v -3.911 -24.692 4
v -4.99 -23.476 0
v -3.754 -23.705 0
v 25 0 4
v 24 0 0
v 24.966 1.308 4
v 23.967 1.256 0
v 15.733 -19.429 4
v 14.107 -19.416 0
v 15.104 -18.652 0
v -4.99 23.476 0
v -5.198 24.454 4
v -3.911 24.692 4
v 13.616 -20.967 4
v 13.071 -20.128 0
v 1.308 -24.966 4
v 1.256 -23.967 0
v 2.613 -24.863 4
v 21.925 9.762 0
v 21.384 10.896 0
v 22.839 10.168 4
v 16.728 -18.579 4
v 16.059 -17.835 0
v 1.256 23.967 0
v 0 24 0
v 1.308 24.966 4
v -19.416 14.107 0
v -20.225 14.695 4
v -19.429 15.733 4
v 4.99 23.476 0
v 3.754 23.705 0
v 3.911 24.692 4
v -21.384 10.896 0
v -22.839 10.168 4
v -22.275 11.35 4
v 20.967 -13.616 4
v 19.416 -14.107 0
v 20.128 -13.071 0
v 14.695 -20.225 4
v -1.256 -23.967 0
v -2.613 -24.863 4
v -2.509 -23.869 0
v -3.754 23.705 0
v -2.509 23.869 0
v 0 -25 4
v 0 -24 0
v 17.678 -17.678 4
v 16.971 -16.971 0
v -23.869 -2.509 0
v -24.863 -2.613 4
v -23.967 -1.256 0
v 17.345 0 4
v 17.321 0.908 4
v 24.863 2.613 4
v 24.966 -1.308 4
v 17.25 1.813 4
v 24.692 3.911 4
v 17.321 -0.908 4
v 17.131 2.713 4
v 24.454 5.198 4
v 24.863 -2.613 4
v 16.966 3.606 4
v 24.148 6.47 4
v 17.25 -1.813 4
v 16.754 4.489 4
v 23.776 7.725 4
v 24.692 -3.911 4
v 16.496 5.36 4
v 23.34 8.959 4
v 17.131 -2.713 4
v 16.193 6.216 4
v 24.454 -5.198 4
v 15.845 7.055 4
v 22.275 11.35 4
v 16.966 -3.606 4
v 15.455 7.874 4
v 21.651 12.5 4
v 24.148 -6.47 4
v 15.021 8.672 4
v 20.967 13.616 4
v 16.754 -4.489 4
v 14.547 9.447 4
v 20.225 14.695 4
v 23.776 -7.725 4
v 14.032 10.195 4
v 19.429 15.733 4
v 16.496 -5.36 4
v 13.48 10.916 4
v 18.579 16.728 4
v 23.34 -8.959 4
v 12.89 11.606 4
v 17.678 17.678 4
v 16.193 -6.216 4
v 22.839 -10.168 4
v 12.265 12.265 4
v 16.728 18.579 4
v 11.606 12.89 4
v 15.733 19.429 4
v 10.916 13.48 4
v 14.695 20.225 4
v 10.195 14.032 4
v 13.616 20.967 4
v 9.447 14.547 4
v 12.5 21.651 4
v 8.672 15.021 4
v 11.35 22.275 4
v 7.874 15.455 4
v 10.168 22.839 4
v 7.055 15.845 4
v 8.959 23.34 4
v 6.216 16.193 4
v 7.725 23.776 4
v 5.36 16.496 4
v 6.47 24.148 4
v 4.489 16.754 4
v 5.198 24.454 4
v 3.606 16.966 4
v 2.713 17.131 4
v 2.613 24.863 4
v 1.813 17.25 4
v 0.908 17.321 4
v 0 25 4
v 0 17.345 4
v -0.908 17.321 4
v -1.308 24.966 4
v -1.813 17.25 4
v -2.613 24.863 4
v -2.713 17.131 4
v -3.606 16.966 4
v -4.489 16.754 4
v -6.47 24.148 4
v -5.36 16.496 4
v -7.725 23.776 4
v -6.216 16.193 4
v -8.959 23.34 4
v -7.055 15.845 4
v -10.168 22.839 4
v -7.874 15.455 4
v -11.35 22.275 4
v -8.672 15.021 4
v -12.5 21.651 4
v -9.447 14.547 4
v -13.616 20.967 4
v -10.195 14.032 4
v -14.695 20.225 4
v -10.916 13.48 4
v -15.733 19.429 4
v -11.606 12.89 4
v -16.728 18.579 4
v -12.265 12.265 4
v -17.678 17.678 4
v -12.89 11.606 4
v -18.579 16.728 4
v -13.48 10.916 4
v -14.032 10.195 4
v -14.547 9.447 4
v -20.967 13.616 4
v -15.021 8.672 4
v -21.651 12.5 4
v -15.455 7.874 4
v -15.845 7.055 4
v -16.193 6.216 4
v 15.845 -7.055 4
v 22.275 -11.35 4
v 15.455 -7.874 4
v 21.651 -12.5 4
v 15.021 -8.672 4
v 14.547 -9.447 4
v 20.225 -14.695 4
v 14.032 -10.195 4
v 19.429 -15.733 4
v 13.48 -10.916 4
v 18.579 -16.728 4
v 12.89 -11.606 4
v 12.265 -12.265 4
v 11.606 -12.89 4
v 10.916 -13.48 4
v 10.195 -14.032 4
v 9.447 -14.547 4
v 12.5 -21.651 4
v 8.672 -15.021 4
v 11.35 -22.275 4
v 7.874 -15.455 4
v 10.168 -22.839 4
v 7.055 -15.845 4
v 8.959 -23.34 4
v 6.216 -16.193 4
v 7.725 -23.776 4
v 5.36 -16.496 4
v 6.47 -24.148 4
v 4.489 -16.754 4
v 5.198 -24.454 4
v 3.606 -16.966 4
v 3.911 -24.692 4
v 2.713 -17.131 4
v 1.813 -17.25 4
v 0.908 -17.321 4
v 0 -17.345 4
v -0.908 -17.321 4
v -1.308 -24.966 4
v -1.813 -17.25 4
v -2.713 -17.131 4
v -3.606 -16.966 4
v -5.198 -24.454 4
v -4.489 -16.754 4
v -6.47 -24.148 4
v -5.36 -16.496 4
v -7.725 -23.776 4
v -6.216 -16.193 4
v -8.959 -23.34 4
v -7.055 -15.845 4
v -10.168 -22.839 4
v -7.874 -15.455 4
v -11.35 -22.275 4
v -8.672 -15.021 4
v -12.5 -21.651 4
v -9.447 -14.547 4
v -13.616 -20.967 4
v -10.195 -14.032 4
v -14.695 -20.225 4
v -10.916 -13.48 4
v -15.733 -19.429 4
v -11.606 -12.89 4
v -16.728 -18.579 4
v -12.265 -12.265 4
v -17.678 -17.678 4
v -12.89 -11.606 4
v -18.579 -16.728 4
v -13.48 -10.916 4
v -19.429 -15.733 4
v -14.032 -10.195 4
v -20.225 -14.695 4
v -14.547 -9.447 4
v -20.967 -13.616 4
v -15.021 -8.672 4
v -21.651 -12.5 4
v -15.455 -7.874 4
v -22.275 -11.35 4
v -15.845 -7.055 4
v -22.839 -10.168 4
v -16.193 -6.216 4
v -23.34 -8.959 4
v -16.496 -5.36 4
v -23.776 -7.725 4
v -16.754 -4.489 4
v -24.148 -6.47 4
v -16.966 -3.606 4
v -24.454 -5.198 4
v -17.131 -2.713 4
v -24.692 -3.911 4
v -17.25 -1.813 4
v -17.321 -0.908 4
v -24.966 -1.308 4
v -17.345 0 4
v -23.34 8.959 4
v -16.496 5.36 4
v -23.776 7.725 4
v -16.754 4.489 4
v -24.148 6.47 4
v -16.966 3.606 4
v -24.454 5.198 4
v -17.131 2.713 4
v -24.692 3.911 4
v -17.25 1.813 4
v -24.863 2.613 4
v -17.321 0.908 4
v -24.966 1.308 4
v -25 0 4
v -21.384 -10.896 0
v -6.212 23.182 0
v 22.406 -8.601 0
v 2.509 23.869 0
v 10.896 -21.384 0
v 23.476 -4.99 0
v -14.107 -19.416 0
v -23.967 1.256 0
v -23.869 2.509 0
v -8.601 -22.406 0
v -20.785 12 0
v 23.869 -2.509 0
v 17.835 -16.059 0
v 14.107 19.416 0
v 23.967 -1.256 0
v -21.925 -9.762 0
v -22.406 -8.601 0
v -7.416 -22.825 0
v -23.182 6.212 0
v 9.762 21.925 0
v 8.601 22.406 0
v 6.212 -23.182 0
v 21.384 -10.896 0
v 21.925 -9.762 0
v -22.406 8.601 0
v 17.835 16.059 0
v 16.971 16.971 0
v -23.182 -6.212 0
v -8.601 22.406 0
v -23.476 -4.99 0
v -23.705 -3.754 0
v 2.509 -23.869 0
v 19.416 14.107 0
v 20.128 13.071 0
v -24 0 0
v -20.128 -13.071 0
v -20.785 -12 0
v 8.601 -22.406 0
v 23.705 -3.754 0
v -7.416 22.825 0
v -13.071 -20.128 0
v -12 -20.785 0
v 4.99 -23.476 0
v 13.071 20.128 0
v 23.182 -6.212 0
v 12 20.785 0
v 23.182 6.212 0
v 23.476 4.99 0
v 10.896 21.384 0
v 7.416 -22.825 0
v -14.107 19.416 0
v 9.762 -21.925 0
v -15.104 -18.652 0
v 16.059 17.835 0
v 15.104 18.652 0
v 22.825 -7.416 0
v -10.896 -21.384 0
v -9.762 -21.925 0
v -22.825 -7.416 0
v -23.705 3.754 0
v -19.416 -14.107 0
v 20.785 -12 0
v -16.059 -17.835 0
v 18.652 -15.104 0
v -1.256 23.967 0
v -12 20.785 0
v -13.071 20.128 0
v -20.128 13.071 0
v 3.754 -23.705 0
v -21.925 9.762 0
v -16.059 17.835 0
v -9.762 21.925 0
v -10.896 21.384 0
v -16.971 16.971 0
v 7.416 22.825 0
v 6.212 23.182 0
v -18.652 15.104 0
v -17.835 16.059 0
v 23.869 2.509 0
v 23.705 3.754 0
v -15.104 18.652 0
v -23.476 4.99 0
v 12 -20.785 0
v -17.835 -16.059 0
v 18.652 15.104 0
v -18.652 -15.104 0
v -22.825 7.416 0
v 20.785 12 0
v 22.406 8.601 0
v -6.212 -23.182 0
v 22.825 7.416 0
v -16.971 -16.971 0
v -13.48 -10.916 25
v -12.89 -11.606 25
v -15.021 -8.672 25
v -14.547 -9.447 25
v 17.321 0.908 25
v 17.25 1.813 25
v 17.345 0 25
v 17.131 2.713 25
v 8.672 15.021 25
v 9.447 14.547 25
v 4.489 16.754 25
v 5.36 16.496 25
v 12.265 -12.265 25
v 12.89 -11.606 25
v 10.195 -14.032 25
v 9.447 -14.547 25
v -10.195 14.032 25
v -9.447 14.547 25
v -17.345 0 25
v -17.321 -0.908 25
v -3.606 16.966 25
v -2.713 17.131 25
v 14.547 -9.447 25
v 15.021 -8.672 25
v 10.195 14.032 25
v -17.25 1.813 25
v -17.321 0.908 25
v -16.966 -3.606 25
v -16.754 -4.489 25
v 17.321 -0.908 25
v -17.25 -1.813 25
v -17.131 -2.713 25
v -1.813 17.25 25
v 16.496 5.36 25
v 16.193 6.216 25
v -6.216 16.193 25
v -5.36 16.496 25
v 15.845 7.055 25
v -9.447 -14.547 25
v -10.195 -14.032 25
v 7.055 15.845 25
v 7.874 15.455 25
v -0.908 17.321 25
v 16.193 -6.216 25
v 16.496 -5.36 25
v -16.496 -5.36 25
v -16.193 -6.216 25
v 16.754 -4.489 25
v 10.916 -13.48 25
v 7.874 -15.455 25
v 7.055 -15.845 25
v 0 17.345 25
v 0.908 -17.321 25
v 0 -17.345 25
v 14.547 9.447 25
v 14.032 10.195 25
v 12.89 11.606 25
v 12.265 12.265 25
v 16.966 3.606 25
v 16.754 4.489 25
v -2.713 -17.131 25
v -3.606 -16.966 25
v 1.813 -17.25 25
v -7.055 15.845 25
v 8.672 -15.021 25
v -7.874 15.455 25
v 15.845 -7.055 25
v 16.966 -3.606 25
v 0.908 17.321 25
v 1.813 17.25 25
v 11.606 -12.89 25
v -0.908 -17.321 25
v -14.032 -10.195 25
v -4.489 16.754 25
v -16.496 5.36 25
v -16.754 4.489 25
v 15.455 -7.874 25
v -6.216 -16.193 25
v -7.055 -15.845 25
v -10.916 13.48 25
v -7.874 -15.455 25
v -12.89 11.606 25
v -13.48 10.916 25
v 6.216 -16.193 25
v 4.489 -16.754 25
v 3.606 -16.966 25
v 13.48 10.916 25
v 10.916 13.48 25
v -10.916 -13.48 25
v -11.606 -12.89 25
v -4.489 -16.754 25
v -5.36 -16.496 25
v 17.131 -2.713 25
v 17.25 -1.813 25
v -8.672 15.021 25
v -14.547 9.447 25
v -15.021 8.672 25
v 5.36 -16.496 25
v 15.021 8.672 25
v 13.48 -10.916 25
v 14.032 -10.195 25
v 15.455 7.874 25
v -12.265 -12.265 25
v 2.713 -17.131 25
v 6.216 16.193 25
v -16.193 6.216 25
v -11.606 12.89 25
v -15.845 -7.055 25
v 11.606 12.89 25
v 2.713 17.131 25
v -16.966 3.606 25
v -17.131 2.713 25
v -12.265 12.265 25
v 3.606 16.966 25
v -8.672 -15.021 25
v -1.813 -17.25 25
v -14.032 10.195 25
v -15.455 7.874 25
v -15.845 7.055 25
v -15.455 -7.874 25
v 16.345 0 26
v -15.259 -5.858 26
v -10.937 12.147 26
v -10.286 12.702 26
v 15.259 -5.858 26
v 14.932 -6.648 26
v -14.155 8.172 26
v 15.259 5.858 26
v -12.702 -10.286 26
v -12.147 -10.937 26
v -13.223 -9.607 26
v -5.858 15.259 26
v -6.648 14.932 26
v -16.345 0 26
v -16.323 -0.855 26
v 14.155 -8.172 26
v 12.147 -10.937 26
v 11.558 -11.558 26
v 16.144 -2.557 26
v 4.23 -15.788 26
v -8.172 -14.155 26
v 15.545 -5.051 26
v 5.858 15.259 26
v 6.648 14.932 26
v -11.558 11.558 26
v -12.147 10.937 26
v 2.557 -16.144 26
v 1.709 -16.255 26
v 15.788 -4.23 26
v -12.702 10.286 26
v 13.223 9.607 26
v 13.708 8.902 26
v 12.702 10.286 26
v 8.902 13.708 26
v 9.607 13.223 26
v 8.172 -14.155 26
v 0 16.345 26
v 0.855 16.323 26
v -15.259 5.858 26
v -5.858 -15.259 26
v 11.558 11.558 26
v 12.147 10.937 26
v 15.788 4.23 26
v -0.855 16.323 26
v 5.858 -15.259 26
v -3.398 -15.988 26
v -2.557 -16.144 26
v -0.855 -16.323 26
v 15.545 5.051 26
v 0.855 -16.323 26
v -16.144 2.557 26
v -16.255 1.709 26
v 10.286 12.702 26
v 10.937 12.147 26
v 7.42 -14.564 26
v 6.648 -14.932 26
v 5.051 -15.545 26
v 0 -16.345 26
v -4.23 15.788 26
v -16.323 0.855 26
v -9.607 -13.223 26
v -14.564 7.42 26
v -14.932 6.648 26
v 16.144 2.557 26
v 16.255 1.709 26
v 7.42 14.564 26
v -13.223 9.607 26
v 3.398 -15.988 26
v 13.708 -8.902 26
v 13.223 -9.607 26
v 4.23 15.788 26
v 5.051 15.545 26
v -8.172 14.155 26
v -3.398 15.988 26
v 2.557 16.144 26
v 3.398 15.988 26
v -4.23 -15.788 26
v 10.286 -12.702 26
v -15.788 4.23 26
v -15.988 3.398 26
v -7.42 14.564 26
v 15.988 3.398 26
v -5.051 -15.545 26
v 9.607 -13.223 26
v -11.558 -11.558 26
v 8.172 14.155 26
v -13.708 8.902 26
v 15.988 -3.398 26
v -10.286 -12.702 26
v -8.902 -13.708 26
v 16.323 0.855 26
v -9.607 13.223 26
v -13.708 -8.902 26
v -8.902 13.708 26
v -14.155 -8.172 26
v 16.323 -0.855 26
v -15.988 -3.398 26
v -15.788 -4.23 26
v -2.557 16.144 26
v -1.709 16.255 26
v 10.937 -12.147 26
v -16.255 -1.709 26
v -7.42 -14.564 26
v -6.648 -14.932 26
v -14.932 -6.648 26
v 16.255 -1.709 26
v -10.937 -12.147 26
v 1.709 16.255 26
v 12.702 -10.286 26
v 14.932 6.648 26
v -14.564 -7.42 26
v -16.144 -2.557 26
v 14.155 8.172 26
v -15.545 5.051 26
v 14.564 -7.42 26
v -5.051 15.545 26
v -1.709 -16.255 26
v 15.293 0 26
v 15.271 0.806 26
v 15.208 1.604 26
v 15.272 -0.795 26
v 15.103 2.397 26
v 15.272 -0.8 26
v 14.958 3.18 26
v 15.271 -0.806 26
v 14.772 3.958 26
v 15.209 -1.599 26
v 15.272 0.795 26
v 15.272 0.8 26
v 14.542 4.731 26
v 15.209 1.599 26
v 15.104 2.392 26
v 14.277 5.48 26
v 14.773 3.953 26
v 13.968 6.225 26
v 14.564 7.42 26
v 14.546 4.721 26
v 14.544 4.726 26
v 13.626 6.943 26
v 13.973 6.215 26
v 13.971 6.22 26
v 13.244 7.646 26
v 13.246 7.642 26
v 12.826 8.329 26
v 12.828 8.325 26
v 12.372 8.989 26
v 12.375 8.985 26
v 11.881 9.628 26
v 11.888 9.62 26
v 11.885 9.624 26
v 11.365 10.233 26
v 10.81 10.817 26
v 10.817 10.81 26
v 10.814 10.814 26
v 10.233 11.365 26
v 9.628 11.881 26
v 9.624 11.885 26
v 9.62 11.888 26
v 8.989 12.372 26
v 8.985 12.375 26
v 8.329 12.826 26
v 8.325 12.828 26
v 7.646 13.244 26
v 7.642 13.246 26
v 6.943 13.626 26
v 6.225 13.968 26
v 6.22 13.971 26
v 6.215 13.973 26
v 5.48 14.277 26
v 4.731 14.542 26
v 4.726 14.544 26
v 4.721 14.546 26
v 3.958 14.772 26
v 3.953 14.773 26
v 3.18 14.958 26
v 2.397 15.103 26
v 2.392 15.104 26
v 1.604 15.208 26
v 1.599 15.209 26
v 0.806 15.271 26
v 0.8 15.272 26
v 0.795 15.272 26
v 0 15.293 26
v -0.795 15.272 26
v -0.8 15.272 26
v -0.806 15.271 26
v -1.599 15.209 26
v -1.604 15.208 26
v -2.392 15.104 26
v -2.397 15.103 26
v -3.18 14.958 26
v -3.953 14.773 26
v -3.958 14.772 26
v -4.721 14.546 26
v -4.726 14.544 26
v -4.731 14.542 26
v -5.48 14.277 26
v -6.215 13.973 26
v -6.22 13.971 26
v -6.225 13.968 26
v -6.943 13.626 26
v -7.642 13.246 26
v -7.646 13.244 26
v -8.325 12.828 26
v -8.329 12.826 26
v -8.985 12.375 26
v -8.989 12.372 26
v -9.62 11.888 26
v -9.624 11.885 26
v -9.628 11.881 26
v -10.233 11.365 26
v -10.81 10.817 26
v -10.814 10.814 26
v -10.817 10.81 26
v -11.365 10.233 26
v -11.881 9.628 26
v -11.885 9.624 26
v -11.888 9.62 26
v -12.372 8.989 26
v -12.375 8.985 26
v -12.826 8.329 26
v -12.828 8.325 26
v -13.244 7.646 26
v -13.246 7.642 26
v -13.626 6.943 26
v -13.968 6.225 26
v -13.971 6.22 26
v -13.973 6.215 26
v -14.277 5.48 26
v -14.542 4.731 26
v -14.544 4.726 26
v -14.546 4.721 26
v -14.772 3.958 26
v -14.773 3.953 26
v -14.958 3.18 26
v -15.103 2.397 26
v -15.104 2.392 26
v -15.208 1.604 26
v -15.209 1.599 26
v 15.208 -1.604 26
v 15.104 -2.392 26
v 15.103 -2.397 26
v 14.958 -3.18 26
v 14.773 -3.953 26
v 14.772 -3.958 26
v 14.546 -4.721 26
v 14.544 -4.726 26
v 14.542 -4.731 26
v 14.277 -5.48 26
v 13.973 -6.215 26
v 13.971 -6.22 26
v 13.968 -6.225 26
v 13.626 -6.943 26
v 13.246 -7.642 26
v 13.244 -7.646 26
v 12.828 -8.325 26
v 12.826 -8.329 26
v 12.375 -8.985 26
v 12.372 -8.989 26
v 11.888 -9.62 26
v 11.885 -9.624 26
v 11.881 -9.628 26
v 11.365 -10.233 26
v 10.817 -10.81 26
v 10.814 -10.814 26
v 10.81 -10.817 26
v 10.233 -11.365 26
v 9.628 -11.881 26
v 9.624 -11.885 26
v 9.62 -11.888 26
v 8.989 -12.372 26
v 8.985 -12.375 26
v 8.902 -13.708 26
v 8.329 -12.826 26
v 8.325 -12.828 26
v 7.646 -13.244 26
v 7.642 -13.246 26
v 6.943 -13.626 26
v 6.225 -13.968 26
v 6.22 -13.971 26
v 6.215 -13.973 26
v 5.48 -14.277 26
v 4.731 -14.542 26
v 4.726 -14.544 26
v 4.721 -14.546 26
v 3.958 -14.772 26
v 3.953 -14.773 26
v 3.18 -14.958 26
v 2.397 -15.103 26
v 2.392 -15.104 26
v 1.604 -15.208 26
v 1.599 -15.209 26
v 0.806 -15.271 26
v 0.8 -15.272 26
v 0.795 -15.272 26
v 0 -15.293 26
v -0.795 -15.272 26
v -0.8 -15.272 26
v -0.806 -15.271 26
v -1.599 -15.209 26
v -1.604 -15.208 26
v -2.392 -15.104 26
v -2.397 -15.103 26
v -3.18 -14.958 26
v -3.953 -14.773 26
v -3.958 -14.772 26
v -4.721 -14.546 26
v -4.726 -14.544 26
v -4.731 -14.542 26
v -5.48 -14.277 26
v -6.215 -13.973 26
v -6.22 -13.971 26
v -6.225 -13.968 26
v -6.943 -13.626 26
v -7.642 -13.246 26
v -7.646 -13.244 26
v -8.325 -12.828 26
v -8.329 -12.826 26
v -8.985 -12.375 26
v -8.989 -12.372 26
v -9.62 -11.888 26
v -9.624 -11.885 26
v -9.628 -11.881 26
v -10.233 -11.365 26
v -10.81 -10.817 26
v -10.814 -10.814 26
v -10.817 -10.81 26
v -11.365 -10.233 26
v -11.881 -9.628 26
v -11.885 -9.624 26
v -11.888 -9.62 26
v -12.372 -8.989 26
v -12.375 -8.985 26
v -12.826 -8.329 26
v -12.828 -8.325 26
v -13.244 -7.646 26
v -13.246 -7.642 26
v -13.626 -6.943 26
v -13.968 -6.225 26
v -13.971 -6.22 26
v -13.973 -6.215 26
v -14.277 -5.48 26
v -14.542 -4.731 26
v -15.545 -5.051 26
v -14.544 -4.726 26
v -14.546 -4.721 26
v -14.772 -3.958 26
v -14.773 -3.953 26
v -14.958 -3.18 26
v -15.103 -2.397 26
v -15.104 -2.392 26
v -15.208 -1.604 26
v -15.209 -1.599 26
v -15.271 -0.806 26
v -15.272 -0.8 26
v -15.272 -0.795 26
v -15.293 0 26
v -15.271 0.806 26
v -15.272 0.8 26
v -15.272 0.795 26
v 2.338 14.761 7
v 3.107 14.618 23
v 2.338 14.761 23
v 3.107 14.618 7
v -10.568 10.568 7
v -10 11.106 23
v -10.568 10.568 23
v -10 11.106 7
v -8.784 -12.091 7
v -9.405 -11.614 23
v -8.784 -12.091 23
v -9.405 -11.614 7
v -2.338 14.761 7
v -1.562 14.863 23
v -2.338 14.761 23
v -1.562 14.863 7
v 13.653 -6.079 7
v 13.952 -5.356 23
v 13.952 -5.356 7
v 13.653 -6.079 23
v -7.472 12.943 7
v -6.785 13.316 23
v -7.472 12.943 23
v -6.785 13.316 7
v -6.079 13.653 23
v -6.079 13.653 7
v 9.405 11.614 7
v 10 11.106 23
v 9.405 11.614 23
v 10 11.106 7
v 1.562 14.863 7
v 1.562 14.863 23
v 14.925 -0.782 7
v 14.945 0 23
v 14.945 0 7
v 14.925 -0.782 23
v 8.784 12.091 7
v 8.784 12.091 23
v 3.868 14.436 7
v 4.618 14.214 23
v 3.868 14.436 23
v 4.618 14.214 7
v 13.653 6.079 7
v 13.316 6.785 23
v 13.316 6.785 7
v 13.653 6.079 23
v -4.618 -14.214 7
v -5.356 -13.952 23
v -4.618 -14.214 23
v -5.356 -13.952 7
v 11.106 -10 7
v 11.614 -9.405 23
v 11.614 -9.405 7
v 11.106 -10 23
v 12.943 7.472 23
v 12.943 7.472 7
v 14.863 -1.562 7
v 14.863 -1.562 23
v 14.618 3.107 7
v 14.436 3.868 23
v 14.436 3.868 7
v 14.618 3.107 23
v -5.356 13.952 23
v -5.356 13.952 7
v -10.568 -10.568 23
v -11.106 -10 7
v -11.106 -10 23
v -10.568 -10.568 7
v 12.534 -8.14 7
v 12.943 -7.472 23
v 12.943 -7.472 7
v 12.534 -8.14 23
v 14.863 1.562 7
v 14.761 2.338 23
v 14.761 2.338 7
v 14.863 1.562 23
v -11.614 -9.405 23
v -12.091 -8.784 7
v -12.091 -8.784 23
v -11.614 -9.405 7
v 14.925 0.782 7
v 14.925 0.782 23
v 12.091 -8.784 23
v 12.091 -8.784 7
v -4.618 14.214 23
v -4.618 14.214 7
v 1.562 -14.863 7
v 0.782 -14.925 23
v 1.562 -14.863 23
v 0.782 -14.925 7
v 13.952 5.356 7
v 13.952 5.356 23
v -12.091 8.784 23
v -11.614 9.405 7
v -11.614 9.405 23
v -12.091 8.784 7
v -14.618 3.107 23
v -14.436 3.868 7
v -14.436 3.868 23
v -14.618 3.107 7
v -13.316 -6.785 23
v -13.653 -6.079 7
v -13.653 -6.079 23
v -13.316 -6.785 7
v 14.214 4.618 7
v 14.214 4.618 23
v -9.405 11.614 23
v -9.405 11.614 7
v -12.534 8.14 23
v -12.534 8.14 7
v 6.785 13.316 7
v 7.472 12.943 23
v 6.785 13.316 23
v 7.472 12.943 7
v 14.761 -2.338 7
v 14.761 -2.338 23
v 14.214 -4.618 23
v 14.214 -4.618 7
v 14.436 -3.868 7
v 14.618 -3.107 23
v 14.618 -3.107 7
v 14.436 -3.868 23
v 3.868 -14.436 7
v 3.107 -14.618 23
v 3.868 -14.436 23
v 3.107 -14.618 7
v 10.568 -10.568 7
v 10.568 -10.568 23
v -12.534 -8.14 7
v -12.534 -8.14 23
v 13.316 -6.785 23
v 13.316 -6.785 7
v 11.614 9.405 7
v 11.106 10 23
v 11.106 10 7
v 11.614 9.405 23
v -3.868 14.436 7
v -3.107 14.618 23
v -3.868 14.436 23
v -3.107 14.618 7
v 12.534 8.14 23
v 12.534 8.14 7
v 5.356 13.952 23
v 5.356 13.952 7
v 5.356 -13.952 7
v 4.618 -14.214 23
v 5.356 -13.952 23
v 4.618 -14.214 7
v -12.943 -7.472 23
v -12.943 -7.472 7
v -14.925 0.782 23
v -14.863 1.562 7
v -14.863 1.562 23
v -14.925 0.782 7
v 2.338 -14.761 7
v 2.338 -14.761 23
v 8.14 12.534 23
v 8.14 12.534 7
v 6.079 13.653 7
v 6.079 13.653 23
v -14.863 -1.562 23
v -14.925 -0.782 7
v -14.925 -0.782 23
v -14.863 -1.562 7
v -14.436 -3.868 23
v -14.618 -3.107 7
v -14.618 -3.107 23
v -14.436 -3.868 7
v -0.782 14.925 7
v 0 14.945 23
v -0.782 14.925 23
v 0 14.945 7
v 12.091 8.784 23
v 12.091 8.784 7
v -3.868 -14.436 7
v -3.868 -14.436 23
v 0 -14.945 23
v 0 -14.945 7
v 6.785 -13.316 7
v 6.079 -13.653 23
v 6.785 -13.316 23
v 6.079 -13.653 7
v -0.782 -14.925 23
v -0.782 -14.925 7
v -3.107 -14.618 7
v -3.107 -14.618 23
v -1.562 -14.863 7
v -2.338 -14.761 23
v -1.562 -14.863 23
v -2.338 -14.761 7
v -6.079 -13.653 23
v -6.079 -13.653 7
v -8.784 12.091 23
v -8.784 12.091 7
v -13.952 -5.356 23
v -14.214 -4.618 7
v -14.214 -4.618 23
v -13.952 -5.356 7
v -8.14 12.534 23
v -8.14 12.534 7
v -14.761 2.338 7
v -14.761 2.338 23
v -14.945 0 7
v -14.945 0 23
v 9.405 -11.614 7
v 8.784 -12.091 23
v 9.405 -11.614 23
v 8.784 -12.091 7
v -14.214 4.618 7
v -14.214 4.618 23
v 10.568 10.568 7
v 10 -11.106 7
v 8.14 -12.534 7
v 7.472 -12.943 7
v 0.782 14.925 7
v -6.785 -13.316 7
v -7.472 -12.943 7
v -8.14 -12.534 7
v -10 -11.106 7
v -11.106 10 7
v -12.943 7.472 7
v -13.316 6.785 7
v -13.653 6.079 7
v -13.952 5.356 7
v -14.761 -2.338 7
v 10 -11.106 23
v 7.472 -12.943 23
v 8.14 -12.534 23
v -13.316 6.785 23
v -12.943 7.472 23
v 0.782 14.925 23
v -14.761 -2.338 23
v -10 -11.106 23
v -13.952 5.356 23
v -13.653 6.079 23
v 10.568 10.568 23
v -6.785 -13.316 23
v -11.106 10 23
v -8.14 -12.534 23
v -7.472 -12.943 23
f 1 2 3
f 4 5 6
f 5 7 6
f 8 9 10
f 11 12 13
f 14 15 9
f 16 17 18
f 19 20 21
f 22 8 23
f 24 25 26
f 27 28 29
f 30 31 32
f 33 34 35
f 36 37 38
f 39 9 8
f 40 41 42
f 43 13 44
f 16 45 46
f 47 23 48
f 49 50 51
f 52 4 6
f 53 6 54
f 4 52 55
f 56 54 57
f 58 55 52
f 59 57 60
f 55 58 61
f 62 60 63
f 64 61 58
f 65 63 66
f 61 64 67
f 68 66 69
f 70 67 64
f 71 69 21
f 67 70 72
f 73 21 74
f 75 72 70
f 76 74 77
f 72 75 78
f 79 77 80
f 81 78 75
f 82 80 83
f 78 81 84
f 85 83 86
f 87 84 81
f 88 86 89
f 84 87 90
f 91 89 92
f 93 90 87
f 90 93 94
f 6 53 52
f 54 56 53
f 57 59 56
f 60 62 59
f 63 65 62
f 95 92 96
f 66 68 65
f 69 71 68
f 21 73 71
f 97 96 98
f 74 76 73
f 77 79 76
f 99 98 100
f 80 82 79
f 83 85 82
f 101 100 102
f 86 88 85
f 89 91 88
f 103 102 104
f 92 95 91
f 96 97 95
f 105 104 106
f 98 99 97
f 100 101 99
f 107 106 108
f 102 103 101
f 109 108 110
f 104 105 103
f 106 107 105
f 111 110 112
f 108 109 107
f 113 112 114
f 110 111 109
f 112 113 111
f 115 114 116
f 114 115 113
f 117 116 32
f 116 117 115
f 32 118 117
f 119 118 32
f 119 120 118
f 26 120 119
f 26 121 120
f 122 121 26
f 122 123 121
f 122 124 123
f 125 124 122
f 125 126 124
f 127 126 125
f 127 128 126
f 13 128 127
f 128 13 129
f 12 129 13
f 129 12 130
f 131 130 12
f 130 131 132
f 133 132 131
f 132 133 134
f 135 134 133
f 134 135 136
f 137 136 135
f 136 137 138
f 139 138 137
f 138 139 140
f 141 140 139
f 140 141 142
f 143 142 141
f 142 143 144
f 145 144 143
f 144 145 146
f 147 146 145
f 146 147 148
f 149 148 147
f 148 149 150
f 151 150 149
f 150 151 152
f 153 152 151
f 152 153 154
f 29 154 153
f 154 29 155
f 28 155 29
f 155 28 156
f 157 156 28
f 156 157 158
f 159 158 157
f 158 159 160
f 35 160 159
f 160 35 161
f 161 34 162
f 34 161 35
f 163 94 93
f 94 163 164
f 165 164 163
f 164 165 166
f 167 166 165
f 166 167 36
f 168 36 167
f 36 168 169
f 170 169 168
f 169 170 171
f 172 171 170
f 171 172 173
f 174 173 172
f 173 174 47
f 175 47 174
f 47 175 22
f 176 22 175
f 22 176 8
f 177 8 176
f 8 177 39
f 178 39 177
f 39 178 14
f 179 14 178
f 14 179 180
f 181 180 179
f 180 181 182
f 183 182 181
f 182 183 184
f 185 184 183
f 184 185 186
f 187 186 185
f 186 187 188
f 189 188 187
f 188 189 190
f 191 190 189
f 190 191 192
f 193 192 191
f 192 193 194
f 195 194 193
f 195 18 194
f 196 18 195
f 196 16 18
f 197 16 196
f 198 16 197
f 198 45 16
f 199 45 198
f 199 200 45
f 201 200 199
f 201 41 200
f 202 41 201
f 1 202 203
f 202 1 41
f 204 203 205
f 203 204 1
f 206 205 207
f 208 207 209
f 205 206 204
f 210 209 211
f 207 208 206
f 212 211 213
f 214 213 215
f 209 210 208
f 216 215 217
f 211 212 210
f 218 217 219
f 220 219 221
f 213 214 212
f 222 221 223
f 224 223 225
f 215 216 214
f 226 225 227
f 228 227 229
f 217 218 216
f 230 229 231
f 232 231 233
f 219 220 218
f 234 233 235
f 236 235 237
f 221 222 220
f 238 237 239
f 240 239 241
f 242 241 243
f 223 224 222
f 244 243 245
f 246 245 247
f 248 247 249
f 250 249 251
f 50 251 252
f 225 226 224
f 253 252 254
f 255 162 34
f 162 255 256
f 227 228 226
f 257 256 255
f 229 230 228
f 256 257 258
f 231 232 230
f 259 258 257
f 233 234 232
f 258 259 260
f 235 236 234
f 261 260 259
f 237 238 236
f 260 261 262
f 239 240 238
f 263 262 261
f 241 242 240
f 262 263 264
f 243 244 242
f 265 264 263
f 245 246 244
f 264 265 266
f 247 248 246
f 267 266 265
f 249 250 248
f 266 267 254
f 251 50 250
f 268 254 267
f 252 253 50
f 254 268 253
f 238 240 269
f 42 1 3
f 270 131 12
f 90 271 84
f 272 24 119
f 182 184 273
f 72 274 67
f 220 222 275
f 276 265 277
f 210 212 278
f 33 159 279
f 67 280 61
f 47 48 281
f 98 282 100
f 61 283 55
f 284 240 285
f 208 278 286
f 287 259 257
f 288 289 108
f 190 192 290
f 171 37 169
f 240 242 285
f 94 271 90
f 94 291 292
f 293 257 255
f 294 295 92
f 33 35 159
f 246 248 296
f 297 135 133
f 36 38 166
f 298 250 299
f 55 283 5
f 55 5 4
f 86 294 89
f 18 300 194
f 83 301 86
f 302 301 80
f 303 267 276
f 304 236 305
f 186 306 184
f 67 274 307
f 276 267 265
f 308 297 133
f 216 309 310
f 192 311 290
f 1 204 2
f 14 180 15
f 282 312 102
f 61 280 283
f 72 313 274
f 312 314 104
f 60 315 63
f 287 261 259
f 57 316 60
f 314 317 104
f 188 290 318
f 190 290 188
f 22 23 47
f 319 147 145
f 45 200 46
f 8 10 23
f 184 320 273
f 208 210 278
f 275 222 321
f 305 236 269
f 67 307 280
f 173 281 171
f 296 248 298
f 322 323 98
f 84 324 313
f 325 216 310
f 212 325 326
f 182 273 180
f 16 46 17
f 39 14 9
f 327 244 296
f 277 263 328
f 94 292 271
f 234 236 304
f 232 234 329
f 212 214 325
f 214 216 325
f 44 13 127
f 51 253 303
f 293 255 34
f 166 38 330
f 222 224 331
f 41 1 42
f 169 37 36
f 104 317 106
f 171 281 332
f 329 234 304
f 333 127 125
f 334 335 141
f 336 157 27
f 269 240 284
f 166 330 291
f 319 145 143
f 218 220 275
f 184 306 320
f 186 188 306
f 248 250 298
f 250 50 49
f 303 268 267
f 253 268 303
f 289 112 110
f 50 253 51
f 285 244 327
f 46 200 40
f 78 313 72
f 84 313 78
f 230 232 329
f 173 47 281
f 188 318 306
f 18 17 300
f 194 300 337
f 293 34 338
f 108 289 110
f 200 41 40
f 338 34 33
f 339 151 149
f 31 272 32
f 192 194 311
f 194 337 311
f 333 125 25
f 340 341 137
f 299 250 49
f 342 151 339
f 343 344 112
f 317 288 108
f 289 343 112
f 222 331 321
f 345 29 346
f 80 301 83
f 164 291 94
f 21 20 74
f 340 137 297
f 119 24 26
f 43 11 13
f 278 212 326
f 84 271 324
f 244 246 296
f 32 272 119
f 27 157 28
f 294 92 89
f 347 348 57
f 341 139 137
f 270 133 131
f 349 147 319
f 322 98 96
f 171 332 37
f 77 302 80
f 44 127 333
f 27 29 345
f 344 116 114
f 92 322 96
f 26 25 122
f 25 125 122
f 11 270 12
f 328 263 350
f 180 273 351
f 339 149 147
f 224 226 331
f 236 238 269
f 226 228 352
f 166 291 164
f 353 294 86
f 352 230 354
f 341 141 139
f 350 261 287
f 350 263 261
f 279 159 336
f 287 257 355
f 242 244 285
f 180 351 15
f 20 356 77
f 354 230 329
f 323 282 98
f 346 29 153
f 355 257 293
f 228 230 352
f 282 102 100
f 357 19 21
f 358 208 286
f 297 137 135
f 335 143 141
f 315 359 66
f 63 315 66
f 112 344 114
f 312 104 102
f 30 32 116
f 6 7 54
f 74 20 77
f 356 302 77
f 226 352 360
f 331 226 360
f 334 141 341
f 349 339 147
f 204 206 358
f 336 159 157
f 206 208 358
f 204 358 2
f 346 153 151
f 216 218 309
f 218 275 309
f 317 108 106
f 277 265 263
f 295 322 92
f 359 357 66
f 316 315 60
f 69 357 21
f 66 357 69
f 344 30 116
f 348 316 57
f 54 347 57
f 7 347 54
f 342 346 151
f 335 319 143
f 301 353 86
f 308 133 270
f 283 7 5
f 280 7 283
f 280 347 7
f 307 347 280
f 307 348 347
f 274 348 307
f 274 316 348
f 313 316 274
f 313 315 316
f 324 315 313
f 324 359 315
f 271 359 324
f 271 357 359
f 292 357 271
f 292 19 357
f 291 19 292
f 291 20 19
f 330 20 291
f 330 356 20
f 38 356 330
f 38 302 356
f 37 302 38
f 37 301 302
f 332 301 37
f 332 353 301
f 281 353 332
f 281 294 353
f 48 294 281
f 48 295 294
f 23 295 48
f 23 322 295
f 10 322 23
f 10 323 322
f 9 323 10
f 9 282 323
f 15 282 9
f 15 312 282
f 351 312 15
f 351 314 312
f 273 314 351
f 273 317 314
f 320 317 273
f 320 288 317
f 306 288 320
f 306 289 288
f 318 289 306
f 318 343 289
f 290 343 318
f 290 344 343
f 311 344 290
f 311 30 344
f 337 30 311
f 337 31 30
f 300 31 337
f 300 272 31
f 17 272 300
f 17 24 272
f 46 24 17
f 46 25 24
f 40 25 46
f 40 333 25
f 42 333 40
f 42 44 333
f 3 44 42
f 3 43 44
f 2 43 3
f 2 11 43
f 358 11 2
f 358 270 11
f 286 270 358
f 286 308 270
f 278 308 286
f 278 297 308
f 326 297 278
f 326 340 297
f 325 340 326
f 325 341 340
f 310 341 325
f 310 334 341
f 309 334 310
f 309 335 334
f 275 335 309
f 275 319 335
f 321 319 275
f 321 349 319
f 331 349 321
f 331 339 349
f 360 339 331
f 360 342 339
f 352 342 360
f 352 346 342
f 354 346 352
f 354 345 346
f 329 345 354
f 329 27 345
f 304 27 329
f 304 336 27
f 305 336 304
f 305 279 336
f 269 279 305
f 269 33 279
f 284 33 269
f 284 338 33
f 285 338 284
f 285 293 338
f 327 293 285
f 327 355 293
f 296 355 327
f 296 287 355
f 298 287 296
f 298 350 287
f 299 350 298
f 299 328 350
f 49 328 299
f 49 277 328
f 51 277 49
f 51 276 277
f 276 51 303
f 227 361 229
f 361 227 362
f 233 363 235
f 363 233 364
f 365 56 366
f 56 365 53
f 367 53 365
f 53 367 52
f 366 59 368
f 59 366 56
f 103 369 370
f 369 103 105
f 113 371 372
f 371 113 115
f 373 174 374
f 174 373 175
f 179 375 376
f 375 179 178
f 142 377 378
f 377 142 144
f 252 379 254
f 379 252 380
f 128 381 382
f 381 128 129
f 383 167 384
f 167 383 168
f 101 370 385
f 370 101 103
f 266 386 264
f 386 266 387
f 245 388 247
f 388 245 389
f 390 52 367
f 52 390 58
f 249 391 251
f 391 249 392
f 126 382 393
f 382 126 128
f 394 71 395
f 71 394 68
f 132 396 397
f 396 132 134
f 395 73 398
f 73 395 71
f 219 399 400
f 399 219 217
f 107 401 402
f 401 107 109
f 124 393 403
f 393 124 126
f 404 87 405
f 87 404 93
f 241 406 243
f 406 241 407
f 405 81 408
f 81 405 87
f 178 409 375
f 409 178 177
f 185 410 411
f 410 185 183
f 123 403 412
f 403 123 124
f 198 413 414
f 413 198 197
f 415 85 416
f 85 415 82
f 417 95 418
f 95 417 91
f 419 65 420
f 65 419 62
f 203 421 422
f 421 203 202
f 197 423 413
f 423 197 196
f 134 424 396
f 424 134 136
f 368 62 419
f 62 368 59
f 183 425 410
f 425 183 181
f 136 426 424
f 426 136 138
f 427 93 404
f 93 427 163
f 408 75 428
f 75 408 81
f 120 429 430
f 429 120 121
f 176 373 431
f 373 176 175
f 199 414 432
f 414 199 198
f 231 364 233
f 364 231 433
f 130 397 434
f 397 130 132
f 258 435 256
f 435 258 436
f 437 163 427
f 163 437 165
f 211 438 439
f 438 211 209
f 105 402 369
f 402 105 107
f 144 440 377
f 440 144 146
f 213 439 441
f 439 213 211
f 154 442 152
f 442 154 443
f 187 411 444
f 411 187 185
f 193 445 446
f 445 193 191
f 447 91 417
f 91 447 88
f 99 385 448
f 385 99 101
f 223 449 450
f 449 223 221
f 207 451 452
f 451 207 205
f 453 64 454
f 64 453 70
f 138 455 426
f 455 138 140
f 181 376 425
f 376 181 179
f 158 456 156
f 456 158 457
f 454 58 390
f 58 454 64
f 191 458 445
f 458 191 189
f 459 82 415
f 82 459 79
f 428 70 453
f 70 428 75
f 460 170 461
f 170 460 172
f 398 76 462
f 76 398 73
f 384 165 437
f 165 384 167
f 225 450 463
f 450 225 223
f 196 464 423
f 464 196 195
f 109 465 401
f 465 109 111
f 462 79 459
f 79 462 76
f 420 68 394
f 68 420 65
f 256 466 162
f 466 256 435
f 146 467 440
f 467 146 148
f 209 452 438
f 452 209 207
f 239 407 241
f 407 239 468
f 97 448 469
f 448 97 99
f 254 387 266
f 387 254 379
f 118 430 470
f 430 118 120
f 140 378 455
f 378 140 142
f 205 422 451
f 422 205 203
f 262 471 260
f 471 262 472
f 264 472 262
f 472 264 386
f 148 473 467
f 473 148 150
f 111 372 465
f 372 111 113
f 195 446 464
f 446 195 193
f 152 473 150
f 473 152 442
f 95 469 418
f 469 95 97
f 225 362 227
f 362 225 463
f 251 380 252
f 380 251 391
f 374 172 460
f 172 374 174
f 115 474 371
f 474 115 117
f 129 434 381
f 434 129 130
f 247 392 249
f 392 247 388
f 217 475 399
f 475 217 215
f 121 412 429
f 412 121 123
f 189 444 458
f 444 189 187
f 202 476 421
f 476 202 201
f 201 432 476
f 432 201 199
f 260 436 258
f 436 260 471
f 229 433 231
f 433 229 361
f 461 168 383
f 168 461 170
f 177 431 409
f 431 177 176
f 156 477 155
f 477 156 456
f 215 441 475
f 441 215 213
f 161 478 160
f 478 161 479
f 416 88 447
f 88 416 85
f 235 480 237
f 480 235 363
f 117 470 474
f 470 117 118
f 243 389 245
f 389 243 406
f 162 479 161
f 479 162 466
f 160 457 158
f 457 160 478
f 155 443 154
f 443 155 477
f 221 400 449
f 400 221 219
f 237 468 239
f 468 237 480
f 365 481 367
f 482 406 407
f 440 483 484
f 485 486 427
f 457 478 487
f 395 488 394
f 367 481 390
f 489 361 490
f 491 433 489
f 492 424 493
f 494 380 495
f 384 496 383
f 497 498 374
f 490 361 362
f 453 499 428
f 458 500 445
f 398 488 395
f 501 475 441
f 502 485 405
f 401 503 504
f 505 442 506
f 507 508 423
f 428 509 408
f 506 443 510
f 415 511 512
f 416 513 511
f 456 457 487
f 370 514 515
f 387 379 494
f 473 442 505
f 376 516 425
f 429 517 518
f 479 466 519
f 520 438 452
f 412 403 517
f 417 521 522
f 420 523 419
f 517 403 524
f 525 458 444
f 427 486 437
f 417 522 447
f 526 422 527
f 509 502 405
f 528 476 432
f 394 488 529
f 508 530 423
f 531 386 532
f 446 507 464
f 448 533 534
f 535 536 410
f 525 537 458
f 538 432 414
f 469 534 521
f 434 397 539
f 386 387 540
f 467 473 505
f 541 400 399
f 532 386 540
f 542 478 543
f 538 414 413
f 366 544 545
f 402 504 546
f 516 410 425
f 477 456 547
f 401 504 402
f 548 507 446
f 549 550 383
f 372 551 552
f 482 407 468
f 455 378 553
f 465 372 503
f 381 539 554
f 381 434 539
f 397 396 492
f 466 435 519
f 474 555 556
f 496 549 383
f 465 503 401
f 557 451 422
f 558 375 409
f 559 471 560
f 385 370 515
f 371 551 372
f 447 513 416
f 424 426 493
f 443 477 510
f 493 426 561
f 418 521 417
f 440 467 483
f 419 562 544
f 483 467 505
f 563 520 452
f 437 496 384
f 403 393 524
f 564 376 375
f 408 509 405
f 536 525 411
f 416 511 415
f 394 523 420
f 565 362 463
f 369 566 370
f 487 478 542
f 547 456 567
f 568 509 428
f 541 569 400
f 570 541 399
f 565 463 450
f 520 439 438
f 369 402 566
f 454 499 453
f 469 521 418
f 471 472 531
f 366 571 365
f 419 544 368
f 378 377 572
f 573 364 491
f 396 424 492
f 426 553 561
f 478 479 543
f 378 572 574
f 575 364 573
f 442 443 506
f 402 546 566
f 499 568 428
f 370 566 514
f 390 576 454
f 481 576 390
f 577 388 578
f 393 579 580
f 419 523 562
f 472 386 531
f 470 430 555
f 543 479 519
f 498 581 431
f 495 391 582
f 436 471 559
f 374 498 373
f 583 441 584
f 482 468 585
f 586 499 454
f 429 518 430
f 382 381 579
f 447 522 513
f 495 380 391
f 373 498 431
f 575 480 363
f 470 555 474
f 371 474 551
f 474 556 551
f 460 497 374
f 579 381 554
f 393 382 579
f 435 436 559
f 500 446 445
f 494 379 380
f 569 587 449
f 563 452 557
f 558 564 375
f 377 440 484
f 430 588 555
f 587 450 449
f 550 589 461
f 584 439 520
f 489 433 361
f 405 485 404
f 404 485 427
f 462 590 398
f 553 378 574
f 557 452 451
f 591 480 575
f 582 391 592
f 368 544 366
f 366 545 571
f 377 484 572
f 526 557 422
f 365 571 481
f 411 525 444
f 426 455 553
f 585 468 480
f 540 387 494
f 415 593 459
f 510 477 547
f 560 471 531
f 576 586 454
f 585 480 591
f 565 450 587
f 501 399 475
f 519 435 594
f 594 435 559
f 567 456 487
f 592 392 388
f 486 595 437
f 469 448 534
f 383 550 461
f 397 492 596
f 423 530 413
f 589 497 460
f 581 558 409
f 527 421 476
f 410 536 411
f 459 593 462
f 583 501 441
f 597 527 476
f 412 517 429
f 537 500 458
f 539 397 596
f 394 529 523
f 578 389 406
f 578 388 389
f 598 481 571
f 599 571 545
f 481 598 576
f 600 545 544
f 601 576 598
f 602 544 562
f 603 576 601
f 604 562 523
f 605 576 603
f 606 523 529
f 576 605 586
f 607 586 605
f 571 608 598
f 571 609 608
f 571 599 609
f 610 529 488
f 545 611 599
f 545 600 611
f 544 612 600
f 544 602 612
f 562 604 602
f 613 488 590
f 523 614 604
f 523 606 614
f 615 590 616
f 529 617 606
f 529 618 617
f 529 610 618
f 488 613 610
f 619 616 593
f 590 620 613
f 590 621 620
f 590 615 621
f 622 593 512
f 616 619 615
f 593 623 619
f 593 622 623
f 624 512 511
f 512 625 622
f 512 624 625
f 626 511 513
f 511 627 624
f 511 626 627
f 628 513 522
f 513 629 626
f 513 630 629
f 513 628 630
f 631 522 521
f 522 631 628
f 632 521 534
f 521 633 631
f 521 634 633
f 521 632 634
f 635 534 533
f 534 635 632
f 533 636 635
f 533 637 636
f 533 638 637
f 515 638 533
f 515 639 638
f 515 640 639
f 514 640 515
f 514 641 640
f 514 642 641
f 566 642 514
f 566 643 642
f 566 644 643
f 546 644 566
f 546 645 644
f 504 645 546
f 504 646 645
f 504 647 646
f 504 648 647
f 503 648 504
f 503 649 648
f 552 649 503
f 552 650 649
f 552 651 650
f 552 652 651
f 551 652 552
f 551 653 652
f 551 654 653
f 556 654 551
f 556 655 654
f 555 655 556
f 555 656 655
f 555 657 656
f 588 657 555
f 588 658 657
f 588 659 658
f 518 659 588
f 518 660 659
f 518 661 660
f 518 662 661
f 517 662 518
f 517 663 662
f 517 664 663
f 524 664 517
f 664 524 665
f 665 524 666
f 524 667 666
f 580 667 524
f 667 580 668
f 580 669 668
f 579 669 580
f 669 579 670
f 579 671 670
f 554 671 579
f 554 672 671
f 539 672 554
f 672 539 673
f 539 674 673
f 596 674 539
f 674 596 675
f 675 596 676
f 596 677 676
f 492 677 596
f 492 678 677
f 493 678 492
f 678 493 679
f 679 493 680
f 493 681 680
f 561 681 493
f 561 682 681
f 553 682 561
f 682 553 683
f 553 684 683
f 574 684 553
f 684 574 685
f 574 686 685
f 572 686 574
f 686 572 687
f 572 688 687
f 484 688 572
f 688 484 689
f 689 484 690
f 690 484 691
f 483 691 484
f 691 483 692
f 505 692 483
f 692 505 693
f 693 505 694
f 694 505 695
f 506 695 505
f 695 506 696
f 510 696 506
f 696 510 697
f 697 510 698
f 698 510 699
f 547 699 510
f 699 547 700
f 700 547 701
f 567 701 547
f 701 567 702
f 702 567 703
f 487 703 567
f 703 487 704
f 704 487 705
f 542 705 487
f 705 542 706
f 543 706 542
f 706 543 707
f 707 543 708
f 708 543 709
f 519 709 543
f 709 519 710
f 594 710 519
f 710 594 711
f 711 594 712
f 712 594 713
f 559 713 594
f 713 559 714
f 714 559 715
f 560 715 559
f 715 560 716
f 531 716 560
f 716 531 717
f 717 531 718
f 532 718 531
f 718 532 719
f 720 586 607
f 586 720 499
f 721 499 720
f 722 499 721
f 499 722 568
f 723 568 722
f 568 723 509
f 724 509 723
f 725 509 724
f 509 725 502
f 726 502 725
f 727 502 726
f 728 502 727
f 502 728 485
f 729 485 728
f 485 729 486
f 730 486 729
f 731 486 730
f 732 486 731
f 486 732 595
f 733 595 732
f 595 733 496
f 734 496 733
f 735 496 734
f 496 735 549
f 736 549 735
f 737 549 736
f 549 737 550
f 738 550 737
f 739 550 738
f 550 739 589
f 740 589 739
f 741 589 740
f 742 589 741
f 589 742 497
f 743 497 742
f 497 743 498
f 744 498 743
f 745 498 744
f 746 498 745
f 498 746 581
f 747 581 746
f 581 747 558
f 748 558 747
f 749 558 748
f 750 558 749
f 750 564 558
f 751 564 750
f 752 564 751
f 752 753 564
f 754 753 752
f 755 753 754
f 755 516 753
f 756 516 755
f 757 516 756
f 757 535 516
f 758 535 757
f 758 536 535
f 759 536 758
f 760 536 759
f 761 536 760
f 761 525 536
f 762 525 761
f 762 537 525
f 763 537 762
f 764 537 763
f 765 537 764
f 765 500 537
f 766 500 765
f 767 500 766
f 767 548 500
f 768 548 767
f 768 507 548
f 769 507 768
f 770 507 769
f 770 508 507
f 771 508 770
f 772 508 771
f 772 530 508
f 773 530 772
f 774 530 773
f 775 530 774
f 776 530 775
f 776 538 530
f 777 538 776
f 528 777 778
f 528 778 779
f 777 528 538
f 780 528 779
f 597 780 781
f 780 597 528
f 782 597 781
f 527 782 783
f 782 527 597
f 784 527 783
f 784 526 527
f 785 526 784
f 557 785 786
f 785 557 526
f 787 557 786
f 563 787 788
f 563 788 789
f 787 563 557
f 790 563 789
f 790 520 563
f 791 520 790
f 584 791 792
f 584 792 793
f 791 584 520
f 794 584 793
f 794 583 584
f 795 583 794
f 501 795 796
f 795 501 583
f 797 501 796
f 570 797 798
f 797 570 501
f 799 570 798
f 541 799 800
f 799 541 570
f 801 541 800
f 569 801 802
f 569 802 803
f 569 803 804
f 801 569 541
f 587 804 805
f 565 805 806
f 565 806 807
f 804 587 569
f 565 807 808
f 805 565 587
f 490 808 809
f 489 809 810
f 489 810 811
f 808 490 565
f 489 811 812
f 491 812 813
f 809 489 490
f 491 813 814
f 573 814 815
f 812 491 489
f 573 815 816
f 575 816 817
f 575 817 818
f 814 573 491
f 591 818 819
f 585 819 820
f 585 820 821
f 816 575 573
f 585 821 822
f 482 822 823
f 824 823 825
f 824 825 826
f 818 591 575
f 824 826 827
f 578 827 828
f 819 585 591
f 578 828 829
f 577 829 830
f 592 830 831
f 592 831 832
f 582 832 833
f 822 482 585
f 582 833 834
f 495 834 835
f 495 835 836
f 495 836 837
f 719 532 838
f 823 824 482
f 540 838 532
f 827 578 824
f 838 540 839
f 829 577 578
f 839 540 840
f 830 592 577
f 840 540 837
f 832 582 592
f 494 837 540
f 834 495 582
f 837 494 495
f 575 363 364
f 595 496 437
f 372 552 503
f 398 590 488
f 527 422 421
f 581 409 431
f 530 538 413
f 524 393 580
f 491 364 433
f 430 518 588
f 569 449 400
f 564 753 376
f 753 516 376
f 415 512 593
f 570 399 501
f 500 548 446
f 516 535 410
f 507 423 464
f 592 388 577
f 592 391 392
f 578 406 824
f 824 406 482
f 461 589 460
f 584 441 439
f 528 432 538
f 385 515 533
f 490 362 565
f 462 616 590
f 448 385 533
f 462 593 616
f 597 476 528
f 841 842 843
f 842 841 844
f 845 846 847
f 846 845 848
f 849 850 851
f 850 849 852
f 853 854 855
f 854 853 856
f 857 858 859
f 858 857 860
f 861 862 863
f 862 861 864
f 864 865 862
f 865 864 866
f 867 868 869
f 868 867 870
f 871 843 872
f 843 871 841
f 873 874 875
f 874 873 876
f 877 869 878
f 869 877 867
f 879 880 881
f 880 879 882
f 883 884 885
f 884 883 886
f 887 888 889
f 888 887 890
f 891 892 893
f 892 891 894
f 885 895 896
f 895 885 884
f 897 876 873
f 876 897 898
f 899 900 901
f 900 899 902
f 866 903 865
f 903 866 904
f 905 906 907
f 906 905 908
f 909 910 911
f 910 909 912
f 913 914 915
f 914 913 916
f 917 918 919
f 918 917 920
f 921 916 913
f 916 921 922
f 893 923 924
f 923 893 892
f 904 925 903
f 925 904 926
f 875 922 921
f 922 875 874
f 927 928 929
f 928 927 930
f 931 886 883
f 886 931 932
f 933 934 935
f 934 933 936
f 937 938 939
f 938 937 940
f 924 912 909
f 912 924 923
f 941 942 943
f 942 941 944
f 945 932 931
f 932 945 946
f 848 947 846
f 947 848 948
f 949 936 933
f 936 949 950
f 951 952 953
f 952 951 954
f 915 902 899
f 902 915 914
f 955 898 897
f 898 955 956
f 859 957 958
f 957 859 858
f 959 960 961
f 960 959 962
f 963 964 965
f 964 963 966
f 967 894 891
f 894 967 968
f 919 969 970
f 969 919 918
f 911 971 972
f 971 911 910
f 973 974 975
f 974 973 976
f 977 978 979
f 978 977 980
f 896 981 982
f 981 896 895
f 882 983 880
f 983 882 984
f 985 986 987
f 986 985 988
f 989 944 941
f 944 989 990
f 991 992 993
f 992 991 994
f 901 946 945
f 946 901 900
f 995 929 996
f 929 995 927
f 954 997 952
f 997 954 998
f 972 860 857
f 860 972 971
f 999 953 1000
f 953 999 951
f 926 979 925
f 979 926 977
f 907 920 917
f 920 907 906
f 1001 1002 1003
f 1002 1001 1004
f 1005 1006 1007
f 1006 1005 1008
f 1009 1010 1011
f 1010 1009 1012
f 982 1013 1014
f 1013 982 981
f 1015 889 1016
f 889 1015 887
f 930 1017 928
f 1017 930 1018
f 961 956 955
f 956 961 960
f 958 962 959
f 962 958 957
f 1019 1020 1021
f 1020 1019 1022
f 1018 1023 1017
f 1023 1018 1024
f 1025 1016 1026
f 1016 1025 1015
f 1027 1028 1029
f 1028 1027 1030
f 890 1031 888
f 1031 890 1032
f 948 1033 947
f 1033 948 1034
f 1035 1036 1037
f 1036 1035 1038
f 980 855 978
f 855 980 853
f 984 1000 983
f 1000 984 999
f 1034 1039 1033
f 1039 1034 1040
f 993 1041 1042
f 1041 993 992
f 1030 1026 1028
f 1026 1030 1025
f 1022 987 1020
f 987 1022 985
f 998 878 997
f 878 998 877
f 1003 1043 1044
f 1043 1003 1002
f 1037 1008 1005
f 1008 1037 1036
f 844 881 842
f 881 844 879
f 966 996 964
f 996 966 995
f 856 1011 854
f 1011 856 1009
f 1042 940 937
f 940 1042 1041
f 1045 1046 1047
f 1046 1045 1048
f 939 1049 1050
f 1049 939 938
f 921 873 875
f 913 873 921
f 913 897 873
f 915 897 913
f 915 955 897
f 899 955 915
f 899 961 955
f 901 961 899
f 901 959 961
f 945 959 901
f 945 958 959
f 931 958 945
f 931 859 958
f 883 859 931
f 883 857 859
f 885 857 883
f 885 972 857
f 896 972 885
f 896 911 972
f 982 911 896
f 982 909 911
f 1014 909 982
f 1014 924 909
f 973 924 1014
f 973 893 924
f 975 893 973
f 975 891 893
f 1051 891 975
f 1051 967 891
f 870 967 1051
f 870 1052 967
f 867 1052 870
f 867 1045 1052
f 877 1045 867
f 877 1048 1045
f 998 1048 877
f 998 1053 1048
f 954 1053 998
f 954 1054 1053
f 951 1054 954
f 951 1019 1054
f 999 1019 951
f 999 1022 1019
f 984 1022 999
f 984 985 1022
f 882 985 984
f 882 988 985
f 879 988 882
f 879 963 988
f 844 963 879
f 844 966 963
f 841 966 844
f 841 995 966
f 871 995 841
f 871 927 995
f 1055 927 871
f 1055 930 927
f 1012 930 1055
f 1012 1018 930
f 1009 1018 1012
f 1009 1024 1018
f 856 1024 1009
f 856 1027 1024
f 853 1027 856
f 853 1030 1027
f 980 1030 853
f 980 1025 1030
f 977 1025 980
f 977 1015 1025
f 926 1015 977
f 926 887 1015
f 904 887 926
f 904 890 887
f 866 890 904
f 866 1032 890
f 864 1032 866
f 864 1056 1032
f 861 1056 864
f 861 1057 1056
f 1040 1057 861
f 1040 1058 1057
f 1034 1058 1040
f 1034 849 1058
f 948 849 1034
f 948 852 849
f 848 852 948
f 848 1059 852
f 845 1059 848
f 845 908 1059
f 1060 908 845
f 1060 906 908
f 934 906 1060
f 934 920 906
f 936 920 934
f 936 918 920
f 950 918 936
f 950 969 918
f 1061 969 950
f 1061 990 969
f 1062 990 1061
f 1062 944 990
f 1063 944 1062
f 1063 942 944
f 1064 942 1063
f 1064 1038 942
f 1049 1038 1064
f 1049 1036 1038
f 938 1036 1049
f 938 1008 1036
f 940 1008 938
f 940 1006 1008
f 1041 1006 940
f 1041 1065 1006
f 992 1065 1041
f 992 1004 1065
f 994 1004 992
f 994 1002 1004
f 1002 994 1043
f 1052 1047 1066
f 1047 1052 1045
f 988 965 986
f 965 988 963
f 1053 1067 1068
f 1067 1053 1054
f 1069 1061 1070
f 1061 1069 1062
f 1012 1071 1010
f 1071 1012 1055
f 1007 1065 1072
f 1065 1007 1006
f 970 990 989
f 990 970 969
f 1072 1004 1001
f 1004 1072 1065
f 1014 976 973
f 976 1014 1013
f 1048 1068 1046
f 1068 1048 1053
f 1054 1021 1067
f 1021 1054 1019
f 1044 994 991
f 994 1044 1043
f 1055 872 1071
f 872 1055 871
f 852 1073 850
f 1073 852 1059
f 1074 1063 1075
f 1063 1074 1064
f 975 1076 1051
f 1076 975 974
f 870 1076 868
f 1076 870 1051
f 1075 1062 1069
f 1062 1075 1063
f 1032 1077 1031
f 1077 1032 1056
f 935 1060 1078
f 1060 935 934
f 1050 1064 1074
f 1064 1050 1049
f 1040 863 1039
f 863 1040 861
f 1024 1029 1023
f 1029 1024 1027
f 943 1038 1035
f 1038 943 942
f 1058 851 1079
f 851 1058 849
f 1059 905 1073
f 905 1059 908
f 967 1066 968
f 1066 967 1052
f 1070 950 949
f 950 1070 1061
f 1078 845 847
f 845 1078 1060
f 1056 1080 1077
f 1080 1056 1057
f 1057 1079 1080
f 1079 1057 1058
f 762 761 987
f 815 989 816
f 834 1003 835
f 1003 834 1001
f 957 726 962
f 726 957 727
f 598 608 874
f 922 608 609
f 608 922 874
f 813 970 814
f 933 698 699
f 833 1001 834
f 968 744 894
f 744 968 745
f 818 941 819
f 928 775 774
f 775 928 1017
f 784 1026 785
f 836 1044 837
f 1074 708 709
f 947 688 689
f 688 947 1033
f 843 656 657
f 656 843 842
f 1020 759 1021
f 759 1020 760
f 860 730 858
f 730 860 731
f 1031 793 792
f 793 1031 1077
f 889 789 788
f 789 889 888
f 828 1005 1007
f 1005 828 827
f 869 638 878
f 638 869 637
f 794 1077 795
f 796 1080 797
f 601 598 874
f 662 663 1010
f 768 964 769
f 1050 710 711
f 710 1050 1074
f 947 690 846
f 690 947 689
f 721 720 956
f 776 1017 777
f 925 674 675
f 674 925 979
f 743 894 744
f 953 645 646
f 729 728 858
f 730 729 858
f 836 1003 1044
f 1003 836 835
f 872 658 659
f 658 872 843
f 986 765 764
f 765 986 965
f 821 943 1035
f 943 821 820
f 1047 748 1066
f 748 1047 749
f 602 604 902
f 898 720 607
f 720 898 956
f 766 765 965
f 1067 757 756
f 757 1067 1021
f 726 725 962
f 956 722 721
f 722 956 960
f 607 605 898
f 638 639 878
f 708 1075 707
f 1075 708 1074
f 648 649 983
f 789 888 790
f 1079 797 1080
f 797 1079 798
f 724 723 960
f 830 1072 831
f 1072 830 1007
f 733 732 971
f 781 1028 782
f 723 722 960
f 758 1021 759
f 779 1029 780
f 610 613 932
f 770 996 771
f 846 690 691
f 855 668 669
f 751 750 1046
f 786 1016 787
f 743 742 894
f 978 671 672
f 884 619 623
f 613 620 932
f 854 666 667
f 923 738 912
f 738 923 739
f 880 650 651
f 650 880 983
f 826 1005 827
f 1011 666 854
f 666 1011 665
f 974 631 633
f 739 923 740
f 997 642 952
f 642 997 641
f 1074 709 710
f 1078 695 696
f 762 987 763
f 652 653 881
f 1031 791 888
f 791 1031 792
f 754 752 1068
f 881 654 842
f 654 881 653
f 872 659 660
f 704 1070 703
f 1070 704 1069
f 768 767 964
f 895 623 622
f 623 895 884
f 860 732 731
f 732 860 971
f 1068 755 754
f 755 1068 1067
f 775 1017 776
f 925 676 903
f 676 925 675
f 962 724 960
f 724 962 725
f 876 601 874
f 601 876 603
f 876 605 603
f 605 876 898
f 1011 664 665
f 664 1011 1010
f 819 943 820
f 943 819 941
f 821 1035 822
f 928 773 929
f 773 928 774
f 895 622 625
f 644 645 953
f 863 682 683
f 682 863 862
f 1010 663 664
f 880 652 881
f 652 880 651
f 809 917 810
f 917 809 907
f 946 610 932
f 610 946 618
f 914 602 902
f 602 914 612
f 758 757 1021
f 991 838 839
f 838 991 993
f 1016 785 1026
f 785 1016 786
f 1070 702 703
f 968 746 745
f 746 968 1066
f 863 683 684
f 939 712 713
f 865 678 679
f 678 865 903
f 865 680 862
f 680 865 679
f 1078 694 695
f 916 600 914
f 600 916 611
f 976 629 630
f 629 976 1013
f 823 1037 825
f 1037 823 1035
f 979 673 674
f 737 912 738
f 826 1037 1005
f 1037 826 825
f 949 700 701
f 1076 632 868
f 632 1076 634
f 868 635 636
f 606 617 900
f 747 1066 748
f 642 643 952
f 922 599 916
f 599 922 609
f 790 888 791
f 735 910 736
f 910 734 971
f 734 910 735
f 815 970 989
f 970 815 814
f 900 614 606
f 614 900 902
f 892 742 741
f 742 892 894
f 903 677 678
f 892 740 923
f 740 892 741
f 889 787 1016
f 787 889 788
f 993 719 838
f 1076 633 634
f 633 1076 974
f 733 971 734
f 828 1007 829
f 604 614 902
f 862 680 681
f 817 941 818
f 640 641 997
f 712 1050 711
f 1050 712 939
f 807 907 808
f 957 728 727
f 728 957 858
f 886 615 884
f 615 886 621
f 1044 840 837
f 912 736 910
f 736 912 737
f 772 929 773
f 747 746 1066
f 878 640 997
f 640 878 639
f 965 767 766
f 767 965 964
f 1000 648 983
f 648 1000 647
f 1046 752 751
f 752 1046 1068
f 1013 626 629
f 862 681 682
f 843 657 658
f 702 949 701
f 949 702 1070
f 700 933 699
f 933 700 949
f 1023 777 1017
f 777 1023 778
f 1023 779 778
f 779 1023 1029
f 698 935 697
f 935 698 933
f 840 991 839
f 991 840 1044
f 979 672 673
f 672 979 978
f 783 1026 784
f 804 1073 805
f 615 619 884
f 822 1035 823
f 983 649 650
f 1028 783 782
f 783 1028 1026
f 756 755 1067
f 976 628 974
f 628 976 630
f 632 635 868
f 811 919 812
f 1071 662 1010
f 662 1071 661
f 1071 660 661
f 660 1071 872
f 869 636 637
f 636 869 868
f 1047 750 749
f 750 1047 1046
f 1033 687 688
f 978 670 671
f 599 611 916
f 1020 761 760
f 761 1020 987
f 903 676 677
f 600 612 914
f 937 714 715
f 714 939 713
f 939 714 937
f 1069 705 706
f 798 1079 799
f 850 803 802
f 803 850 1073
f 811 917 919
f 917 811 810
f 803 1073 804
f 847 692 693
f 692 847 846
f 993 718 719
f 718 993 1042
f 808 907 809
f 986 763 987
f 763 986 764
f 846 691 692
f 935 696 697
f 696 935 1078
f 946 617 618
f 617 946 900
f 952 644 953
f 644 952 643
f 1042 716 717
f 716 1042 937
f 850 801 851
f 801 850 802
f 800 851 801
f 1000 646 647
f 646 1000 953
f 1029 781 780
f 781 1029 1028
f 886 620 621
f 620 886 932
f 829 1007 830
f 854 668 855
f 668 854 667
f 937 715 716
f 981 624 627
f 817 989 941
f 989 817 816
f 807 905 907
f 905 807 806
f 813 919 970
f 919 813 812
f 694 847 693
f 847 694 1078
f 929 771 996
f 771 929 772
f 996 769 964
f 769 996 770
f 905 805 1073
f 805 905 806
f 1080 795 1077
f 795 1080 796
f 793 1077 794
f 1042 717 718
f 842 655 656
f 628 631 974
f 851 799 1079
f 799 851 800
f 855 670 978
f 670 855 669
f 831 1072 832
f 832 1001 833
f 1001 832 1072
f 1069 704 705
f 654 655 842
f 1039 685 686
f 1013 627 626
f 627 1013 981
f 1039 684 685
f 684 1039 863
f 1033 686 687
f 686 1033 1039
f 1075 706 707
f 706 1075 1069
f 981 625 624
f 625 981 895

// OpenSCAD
/*
    Press-fit end cap for 1-inch EMT conduit

    Nominal EMT outside diameter: 29.54 mm
    Print orientation: closed/flanged end on the print bed
    Units: millimeters
*/

$fn = 120;

// ---------- Fit adjustments ----------

// Actual outside diameter of 1-inch EMT
emt_od = 29.54;

// Clearance between the conduit and cap.
// Start with 0.20 mm for a snug fit.
// Increase to 0.30–0.40 mm if your printer makes holes undersized.
clearance = 0.35;

// The opening is slightly wider to help start the cap.
lead_in_extra = 0.35;

// ---------- Cap dimensions ----------

// How far the cap grips the conduit
grip_depth = 22;

// Thickness around the conduit
wall_thickness = 2.4;

// Thickness of the closed end
end_thickness = 3.0;

// Enlarged stop flange
flange_diameter = 50;
flange_thickness = 4.0;

// Length of tapered lead-in at the open end
lead_in_length = 3.0;

// Slight rounding approximation on outside edges
outside_chamfer = 1.0;


// Derived dimensions
inside_diameter = emt_od + clearance;
body_diameter = inside_diameter + 2 * wall_thickness;
total_height = flange_thickness + grip_depth;


difference() {
    // Outer cap body
    union() {
        // Enlarged flange / stop
        cylinder(
            h = flange_thickness,
            d1 = flange_diameter - 2 * outside_chamfer,
            d2 = flange_diameter
        );

        // Main sleeve
        translate([0, 0, flange_thickness])
            cylinder(
                h = grip_depth - outside_chamfer,
                d = body_diameter
            );

        // Chamfer around open end
        translate([
            0,
            0,
            flange_thickness + grip_depth - outside_chamfer
        ])
            cylinder(
                h = outside_chamfer,
                d1 = body_diameter,
                d2 = body_diameter - 2 * outside_chamfer
            );
    }

    // Hollow area that receives the EMT.
    // It stops before reaching the closed/flanged end.
    translate([
        0,
        0,
        flange_thickness + end_thickness
    ])
        cylinder(
            h = grip_depth - end_thickness - lead_in_length + 0.02,
            d = inside_diameter
        );

    // Tapered lead-in at the open end
    translate([
        0,
        0,
        total_height - lead_in_length
    ])
        cylinder(
            h = lead_in_length + 0.02,
            d1 = inside_diameter,
            d2 = inside_diameter + 2 * lead_in_extra
        );
}
